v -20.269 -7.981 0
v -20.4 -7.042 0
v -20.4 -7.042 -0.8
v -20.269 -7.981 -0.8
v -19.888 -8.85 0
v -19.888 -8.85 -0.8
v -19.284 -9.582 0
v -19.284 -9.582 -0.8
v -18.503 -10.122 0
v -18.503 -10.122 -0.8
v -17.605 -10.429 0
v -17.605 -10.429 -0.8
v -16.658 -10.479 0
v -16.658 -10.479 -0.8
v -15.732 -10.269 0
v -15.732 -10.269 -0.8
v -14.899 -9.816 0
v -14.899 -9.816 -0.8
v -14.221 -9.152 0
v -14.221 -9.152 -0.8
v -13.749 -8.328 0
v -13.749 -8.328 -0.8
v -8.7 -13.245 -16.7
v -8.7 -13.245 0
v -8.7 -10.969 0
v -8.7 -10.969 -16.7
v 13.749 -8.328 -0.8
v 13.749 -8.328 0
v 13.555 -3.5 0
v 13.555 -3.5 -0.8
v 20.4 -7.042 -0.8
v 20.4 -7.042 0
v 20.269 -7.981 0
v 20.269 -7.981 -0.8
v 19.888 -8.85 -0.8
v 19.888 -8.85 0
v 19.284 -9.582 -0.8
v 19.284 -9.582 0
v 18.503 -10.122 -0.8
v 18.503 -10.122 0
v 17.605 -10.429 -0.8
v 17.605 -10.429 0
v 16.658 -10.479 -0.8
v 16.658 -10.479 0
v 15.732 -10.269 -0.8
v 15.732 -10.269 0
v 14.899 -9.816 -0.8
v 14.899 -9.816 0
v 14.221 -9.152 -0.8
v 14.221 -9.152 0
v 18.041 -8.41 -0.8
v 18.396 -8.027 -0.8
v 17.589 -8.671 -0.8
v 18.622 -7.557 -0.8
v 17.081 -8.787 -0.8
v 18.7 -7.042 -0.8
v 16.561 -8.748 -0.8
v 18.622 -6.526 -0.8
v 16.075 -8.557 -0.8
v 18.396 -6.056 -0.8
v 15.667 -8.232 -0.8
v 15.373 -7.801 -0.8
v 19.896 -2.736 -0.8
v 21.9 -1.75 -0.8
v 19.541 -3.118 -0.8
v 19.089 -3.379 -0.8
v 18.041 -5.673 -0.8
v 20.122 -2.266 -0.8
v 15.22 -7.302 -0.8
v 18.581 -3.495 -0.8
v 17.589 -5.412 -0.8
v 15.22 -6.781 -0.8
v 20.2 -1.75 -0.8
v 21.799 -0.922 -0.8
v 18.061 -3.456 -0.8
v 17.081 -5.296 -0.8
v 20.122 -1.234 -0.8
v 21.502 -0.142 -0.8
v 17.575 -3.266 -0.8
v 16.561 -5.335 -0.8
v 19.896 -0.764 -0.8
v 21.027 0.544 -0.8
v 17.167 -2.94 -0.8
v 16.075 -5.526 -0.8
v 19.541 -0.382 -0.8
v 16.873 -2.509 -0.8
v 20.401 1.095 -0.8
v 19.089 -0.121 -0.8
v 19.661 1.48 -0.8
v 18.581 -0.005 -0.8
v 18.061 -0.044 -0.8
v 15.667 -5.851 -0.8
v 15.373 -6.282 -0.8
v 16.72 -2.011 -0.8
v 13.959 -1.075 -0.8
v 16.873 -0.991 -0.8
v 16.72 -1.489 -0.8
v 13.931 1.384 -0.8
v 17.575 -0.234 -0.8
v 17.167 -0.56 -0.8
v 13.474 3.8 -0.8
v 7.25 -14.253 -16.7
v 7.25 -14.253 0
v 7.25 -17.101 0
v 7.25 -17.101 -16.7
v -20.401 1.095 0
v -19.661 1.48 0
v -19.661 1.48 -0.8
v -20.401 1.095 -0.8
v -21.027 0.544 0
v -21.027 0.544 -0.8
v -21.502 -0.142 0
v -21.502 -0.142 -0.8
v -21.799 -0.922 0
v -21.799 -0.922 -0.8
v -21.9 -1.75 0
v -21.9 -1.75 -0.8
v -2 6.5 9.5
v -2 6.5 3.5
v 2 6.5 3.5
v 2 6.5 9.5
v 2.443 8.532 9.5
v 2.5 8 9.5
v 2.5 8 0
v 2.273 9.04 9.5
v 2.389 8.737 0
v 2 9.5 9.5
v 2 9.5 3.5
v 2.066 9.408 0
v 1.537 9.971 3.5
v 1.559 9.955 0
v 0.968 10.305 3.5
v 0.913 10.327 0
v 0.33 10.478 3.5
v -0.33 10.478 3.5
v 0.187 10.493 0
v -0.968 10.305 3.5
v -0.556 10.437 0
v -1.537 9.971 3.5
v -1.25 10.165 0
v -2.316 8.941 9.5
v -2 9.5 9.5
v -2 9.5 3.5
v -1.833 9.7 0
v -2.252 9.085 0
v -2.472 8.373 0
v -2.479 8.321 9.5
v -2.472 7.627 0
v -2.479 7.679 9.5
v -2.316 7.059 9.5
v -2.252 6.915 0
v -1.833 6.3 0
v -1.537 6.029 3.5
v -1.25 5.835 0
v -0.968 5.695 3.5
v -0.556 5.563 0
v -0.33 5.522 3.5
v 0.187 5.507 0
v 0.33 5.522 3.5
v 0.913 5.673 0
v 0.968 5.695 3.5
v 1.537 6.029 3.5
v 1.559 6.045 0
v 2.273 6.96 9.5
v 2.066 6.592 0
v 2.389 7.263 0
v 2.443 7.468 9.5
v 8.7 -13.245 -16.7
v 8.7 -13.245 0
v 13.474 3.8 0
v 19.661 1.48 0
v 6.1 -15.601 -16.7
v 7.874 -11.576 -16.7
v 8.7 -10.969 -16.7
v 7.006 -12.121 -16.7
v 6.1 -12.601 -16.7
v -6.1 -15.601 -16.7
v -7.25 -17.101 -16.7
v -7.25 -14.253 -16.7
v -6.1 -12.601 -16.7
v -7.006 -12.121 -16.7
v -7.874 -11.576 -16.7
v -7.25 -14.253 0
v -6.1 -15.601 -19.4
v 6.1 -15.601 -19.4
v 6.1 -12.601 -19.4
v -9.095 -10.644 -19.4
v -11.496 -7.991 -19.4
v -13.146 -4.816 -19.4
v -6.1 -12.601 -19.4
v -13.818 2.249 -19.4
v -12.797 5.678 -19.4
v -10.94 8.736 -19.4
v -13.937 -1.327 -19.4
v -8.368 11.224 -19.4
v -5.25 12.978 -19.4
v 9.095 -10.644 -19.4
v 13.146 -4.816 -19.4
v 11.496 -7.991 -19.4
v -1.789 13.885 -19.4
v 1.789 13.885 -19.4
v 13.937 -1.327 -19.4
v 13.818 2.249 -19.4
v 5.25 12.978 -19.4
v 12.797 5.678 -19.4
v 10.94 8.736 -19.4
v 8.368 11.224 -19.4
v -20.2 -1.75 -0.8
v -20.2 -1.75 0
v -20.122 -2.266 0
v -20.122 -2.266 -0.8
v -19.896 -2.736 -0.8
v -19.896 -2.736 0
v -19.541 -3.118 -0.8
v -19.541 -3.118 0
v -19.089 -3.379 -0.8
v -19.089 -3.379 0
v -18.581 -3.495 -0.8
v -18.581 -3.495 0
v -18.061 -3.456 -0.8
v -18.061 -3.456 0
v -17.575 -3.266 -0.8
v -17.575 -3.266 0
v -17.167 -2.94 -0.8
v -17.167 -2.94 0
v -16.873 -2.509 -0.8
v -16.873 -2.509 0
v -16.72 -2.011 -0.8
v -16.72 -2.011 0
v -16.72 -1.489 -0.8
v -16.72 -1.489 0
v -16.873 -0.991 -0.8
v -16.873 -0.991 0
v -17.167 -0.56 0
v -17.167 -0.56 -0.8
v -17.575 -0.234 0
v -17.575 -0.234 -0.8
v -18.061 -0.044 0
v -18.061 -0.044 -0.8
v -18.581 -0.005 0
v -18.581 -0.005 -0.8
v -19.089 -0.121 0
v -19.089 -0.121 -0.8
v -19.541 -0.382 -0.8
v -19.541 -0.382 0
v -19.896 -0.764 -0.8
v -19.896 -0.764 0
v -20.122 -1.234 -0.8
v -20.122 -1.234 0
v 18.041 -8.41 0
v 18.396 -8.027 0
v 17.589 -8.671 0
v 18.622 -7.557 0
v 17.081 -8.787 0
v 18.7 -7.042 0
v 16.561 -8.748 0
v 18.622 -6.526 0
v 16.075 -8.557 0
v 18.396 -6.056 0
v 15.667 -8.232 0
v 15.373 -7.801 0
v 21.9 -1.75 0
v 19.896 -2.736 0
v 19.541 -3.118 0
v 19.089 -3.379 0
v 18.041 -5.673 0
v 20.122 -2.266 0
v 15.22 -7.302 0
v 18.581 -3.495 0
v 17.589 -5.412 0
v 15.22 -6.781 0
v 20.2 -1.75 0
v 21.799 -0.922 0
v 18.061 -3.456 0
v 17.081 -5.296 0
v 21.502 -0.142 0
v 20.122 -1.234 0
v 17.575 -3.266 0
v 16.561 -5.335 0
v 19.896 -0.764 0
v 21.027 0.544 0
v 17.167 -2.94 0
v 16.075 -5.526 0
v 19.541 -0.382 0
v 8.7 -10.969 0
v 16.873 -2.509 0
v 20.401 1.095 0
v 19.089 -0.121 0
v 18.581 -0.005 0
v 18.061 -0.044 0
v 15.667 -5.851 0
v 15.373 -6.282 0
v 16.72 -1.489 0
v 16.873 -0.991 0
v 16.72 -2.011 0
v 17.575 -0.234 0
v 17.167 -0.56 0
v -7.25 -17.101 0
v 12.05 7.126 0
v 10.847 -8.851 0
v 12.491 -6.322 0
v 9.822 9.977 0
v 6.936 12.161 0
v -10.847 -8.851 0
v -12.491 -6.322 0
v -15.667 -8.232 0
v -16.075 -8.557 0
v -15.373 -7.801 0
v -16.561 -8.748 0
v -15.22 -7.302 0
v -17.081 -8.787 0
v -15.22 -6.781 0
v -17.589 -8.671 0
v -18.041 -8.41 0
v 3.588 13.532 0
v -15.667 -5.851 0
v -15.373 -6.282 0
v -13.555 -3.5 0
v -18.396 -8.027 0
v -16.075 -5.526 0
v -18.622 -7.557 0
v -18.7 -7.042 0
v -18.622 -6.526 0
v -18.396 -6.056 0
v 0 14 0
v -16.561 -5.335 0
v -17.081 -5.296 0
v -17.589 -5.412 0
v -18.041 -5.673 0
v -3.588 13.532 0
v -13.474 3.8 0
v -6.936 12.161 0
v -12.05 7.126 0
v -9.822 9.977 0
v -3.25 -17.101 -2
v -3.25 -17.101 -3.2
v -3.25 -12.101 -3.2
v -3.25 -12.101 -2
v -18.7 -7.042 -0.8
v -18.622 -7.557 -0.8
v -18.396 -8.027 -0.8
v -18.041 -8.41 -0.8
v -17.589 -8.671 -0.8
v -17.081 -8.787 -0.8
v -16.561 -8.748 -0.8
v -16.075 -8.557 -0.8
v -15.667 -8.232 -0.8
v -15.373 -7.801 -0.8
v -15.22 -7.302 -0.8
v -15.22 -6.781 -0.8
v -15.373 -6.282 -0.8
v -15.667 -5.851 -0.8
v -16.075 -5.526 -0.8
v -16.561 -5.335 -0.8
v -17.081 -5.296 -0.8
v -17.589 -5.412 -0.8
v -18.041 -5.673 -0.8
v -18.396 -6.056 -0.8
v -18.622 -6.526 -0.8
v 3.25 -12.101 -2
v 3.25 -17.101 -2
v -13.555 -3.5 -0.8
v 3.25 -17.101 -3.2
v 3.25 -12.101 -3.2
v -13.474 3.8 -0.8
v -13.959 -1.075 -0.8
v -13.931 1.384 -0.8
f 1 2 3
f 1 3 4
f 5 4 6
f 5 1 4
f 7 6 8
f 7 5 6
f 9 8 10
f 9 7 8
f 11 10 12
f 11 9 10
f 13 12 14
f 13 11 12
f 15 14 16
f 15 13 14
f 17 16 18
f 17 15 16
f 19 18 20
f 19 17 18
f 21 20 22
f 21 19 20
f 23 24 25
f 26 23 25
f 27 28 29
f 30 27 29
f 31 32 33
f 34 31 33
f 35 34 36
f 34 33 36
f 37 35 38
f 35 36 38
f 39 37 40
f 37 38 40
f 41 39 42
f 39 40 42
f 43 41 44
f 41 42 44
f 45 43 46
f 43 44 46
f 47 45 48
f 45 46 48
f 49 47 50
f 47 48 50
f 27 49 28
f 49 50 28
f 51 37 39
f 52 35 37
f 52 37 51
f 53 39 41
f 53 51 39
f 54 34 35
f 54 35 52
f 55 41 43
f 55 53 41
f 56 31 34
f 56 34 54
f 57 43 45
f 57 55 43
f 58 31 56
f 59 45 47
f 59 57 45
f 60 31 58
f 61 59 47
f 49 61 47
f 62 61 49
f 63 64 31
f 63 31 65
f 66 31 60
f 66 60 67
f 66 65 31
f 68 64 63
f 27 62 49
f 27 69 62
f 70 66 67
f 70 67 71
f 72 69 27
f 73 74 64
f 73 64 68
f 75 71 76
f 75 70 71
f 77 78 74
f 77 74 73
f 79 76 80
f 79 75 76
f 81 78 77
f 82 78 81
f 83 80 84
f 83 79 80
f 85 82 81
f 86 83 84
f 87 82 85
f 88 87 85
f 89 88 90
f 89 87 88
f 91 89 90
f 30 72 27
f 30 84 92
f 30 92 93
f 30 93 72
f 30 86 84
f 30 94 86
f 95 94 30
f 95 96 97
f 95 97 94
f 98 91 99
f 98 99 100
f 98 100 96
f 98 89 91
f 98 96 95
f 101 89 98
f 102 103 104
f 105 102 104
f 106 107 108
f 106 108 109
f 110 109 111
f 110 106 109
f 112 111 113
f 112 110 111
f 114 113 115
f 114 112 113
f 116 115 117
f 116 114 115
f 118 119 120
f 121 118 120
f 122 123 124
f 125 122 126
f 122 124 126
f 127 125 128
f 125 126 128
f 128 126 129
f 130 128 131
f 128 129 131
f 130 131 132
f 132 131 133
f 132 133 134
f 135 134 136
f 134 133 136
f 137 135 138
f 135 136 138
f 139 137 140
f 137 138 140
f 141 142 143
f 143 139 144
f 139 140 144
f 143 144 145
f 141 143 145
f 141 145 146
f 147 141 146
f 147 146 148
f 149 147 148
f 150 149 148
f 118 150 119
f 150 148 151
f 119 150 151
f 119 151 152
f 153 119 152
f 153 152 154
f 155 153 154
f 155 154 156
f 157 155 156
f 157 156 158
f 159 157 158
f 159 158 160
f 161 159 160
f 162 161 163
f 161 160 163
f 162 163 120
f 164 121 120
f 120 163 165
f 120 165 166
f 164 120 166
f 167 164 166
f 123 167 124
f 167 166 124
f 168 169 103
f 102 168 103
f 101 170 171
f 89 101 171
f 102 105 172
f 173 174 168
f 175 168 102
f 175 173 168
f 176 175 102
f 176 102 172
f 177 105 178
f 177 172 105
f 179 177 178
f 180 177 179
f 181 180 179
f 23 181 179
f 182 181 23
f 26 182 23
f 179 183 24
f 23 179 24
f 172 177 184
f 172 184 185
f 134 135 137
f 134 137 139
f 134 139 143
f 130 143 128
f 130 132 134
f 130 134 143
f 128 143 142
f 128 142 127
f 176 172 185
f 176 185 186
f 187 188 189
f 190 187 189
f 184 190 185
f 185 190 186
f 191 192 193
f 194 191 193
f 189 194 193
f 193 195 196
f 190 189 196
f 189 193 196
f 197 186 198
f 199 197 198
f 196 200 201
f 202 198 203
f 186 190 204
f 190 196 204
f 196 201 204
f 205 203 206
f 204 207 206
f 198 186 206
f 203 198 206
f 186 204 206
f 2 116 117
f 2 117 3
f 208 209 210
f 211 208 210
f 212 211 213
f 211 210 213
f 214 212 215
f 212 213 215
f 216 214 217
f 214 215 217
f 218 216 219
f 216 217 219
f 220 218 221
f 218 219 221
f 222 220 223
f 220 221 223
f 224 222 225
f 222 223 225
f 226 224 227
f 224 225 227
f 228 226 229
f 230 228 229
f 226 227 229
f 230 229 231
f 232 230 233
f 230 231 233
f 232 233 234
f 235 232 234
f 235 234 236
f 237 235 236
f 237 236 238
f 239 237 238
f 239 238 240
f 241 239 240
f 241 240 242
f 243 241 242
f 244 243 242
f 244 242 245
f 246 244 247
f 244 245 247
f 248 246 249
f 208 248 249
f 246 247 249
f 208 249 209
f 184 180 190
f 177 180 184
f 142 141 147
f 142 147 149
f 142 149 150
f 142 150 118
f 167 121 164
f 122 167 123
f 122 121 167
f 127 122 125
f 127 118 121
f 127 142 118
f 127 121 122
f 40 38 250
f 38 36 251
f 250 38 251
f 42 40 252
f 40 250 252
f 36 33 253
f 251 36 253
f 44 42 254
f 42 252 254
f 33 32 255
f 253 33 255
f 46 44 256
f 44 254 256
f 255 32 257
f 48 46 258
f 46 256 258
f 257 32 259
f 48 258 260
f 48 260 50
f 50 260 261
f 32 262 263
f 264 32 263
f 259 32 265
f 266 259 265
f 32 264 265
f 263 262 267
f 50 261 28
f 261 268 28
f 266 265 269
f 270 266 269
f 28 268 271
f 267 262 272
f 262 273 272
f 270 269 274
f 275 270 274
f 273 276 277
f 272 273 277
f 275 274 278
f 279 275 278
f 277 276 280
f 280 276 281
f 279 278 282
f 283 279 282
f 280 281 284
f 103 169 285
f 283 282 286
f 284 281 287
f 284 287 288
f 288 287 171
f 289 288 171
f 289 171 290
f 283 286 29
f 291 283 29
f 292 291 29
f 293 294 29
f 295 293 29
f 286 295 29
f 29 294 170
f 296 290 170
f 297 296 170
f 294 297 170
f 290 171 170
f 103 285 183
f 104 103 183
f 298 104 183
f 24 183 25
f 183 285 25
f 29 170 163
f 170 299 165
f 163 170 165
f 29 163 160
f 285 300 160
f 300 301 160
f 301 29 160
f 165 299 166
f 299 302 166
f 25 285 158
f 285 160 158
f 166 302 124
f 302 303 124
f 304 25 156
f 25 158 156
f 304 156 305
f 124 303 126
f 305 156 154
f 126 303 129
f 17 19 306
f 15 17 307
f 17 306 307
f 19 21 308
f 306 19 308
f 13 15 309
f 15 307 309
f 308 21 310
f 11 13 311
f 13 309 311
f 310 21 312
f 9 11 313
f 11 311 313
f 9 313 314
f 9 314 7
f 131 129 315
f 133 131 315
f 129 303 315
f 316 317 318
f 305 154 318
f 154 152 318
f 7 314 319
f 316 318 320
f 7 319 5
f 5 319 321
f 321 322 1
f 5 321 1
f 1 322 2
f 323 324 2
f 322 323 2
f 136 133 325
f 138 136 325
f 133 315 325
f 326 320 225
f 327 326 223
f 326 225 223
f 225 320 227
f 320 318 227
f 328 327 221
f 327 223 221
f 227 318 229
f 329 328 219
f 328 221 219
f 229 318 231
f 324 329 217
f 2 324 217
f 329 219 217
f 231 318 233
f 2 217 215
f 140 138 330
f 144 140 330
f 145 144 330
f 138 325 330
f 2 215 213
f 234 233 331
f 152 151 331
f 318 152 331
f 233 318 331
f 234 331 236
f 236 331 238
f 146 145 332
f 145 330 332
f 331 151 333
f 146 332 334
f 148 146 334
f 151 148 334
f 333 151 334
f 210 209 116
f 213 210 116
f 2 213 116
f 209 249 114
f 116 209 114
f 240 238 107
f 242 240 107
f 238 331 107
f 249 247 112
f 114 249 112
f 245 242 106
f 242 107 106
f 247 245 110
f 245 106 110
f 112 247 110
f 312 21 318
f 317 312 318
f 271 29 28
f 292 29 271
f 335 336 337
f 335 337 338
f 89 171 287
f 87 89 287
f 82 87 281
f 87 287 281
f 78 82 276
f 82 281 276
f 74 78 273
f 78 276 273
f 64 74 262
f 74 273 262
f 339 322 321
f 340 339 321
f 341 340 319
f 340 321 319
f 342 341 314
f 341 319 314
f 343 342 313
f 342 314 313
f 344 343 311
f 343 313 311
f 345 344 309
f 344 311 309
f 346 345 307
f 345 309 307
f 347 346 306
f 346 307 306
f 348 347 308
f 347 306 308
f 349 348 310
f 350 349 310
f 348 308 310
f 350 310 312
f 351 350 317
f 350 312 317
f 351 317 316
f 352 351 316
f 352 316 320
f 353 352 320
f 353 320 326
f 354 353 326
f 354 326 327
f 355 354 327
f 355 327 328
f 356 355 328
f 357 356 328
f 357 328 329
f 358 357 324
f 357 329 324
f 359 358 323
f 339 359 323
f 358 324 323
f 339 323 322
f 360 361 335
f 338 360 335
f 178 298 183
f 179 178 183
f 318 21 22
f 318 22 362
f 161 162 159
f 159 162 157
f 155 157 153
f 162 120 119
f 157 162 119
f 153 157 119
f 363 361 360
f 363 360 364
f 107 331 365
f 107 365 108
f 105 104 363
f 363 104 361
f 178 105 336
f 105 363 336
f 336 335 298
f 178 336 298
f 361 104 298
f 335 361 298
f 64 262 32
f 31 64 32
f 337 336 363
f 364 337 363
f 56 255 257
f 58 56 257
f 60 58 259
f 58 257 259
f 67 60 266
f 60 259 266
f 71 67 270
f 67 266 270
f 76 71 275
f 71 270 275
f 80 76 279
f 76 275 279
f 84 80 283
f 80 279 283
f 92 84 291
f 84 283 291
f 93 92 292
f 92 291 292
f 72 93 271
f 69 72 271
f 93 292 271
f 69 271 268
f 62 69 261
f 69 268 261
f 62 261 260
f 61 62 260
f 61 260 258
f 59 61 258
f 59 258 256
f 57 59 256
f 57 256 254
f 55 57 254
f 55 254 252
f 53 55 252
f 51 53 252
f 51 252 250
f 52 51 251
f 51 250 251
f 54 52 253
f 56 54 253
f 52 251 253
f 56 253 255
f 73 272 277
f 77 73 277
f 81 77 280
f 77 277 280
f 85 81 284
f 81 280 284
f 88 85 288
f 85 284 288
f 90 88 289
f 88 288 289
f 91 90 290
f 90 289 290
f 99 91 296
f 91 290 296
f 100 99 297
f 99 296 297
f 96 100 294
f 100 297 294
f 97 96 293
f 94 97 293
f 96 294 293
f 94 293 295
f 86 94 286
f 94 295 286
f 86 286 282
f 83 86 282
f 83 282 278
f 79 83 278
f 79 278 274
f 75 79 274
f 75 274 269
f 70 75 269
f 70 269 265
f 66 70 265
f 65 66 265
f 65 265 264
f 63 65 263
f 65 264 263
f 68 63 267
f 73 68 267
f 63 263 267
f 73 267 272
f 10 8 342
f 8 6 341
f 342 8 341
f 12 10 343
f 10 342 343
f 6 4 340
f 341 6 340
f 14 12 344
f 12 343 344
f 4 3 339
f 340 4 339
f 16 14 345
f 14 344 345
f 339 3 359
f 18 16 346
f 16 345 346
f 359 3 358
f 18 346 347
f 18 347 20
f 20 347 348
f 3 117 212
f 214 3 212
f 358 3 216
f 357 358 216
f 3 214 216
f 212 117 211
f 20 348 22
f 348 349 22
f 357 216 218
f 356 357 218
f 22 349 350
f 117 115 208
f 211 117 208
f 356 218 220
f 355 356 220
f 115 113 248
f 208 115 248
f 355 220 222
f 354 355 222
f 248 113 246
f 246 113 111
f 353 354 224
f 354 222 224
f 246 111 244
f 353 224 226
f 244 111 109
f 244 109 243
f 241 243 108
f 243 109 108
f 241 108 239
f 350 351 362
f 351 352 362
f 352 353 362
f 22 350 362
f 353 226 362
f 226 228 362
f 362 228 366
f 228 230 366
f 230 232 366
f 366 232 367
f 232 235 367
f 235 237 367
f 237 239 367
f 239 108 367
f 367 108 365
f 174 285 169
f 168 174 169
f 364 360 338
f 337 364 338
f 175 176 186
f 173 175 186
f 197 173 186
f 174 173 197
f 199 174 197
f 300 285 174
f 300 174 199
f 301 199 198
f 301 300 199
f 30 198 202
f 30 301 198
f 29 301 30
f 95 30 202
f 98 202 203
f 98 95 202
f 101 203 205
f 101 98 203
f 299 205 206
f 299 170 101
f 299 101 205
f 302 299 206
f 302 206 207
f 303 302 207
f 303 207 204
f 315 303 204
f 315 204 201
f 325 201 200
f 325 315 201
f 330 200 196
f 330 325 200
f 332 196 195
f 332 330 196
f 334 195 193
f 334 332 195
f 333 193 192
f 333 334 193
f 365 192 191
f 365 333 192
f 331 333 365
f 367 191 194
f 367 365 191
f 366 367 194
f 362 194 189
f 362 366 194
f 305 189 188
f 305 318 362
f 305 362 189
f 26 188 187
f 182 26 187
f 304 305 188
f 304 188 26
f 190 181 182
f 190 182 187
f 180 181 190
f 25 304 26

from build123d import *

# Parameters (mm, degrees)
HOUSING_BOSS_EXTRUDE1_DEPTH           = 19.4
PLASTIC_SHEILDING_BOSS_EXTRUDE2_DEPTH = 16.7
SKETCH5_R                             = 1.75
MOUNTING_BRACKETS_BOSS_EXTRUDE3_DEPTH = 0.8
SKETCH6_R                             = 2.5
SHAFT_BOSS_EXTRUDE4_DEPTH             = 9.5
SHAFT_START                           = -6
SHAFT_EDGECUT_EXTRUDE1_DEPTH          = 6
CABLE_HOLE_CUT_EXTRUDE2_DEPTH         = 5


with BuildPart() as part:
    # Sketch2 → Housing Boss-Extrude1 (new body)
    with BuildSketch(Plane.XY):
        with BuildLine():
            Line((-6.1, -15.60119042), (0, -15.60119042))
            Line((0, -15.60119042), (6.1, -15.60119042))
            Line((6.1, -15.60119042), (6.1, -12.60119042))
            ThreePointArc((6.1, -12.60119042), (0, 14), (-6.1, -12.60119042))
            Line((-6.1, -12.60119042), (-6.1, -15.60119042))
        make_face()
    extrude(amount=-HOUSING_BOSS_EXTRUDE1_DEPTH)

    # Sketch4 → Plastic Sheilding Boss-Extrude2 (add)
    with BuildSketch(Plane.XY):
        with BuildLine():
            Line((0, -17.10119042), (-7.25, -17.10119042))
            Line((-7.25, -17.10119042), (-7.25, -14.253185025))
            Line((-7.25, -14.253185025), (-8.7, -13.245236981))
            Line((-8.7, -13.245236981), (-8.7, -10.968591523))
            ThreePointArc((-8.7, -10.968591523), (-7.444887158, -11.856376142), (-6.1, -12.60119042))
            Line((-6.1, -12.60119042), (-6.1, -15.60119042))
            Line((-6.1, -15.60119042), (6.1, -15.60119042))
            Line((6.1, -15.60119042), (6.1, -12.60119042))
            ThreePointArc((6.1, -12.60119042), (7.444887158, -11.856376142), (8.7, -10.968591523))
            Line((8.7, -10.968591523), (8.7, -13.245236981))
            Line((8.7, -13.245236981), (7.25, -14.253185025))
            Line((7.25, -14.253185025), (7.25, -17.10119042))
            Line((7.25, -17.10119042), (0, -17.10119042))
        make_face()
    extrude(amount=-PLASTIC_SHEILDING_BOSS_EXTRUDE2_DEPTH)

    # Sketch5 → Mounting Brackets Boss-Extrude3 (add)
    # profile 1 of 2: a face of its own
    with BuildSketch(Plane.XY):
        with BuildLine():
            Line((13.47442021, 3.8), (19.661172606, 1.480411881))
            ThreePointArc((19.661172606, 1.480411881), (21.285581553, 0.215191404), (21.9, -1.75))
            Line((21.9, -1.75), (20.4, -7.041502622))
            ThreePointArc((20.4, -7.041502622), (17.605339359, -10.428688818), (13.748967928, -8.328317944))
            Line((13.748967928, -8.328317944), (13.555441712, -3.5))
            ThreePointArc((13.555441712, -3.5), (13.999137791, 0.155374132), (13.47442021, 3.8))
        make_face()
        with Locations((18.45, -1.75)):
            Circle(SKETCH5_R, mode=Mode.SUBTRACT)
        with Locations((16.95, -7.041502622)):
            Circle(SKETCH5_R, mode=Mode.SUBTRACT)
    # profile 2 of 2: a face of its own
    with BuildSketch(Plane.XY):
        with BuildLine():
            Line((-13.748967928, -8.328317944), (-13.555441712, -3.5))
            ThreePointArc((-13.555441712, -3.5), (-13.999137791, 0.155374132), (-13.47442021, 3.8))
            Line((-13.47442021, 3.8), (-19.661172606, 1.480411881))
            ThreePointArc((-19.661172606, 1.480411881), (-21.285581553, 0.215191404), (-21.9, -1.75))
            Line((-21.9, -1.75), (-20.4, -7.041502622))
            ThreePointArc((-20.4, -7.041502622), (-17.605339359, -10.428688818), (-13.748967928, -8.328317944))
        make_face()
        with Locations(Location((-16.95, -7.041502622, 0), (0, 0, 180))):
            Circle(SKETCH5_R, mode=Mode.SUBTRACT)
        with Locations(Location((-18.45, -1.75, 0), (0, 0, 180))):
            Circle(SKETCH5_R, mode=Mode.SUBTRACT)
    extrude(amount=-MOUNTING_BRACKETS_BOSS_EXTRUDE3_DEPTH)

    # Sketch6 → Shaft Boss-Extrude4 (add)
    with BuildSketch(Plane.XY):
        with Locations((0, 8)):
            Circle(SKETCH6_R)
    extrude(amount=SHAFT_BOSS_EXTRUDE4_DEPTH)

    # Sketch7 → Shaft EdgeCut-Extrude1 (cut)
    with BuildSketch(Plane.XY.offset(9.5).offset(SHAFT_START)):
        with BuildLine():
            Line((-2, 9.5), (2, 9.5))
            ThreePointArc((2, 9.5), (0, 10.5), (-2, 9.5))
        make_face()
        with BuildLine():
            Line((-2, 6.5), (2, 6.5))
            ThreePointArc((2, 6.5), (0, 5.5), (-2, 6.5))
        make_face()
    extrude(amount=SHAFT_EDGECUT_EXTRUDE1_DEPTH, mode=Mode.SUBTRACT)

    # Sketch8 → Cable Hole Cut-Extrude2 (cut)
    with BuildSketch(Plane.XZ.offset(17.10119042)):
        Polygon((0, -2), (3.25, -2), (3.25, -3.2), (0, -3.2), (-3.25, -3.2), (-3.25, -2), align=None)
    extrude(amount=-CABLE_HOLE_CUT_EXTRUDE2_DEPTH, mode=Mode.SUBTRACT)


solid = part.part
